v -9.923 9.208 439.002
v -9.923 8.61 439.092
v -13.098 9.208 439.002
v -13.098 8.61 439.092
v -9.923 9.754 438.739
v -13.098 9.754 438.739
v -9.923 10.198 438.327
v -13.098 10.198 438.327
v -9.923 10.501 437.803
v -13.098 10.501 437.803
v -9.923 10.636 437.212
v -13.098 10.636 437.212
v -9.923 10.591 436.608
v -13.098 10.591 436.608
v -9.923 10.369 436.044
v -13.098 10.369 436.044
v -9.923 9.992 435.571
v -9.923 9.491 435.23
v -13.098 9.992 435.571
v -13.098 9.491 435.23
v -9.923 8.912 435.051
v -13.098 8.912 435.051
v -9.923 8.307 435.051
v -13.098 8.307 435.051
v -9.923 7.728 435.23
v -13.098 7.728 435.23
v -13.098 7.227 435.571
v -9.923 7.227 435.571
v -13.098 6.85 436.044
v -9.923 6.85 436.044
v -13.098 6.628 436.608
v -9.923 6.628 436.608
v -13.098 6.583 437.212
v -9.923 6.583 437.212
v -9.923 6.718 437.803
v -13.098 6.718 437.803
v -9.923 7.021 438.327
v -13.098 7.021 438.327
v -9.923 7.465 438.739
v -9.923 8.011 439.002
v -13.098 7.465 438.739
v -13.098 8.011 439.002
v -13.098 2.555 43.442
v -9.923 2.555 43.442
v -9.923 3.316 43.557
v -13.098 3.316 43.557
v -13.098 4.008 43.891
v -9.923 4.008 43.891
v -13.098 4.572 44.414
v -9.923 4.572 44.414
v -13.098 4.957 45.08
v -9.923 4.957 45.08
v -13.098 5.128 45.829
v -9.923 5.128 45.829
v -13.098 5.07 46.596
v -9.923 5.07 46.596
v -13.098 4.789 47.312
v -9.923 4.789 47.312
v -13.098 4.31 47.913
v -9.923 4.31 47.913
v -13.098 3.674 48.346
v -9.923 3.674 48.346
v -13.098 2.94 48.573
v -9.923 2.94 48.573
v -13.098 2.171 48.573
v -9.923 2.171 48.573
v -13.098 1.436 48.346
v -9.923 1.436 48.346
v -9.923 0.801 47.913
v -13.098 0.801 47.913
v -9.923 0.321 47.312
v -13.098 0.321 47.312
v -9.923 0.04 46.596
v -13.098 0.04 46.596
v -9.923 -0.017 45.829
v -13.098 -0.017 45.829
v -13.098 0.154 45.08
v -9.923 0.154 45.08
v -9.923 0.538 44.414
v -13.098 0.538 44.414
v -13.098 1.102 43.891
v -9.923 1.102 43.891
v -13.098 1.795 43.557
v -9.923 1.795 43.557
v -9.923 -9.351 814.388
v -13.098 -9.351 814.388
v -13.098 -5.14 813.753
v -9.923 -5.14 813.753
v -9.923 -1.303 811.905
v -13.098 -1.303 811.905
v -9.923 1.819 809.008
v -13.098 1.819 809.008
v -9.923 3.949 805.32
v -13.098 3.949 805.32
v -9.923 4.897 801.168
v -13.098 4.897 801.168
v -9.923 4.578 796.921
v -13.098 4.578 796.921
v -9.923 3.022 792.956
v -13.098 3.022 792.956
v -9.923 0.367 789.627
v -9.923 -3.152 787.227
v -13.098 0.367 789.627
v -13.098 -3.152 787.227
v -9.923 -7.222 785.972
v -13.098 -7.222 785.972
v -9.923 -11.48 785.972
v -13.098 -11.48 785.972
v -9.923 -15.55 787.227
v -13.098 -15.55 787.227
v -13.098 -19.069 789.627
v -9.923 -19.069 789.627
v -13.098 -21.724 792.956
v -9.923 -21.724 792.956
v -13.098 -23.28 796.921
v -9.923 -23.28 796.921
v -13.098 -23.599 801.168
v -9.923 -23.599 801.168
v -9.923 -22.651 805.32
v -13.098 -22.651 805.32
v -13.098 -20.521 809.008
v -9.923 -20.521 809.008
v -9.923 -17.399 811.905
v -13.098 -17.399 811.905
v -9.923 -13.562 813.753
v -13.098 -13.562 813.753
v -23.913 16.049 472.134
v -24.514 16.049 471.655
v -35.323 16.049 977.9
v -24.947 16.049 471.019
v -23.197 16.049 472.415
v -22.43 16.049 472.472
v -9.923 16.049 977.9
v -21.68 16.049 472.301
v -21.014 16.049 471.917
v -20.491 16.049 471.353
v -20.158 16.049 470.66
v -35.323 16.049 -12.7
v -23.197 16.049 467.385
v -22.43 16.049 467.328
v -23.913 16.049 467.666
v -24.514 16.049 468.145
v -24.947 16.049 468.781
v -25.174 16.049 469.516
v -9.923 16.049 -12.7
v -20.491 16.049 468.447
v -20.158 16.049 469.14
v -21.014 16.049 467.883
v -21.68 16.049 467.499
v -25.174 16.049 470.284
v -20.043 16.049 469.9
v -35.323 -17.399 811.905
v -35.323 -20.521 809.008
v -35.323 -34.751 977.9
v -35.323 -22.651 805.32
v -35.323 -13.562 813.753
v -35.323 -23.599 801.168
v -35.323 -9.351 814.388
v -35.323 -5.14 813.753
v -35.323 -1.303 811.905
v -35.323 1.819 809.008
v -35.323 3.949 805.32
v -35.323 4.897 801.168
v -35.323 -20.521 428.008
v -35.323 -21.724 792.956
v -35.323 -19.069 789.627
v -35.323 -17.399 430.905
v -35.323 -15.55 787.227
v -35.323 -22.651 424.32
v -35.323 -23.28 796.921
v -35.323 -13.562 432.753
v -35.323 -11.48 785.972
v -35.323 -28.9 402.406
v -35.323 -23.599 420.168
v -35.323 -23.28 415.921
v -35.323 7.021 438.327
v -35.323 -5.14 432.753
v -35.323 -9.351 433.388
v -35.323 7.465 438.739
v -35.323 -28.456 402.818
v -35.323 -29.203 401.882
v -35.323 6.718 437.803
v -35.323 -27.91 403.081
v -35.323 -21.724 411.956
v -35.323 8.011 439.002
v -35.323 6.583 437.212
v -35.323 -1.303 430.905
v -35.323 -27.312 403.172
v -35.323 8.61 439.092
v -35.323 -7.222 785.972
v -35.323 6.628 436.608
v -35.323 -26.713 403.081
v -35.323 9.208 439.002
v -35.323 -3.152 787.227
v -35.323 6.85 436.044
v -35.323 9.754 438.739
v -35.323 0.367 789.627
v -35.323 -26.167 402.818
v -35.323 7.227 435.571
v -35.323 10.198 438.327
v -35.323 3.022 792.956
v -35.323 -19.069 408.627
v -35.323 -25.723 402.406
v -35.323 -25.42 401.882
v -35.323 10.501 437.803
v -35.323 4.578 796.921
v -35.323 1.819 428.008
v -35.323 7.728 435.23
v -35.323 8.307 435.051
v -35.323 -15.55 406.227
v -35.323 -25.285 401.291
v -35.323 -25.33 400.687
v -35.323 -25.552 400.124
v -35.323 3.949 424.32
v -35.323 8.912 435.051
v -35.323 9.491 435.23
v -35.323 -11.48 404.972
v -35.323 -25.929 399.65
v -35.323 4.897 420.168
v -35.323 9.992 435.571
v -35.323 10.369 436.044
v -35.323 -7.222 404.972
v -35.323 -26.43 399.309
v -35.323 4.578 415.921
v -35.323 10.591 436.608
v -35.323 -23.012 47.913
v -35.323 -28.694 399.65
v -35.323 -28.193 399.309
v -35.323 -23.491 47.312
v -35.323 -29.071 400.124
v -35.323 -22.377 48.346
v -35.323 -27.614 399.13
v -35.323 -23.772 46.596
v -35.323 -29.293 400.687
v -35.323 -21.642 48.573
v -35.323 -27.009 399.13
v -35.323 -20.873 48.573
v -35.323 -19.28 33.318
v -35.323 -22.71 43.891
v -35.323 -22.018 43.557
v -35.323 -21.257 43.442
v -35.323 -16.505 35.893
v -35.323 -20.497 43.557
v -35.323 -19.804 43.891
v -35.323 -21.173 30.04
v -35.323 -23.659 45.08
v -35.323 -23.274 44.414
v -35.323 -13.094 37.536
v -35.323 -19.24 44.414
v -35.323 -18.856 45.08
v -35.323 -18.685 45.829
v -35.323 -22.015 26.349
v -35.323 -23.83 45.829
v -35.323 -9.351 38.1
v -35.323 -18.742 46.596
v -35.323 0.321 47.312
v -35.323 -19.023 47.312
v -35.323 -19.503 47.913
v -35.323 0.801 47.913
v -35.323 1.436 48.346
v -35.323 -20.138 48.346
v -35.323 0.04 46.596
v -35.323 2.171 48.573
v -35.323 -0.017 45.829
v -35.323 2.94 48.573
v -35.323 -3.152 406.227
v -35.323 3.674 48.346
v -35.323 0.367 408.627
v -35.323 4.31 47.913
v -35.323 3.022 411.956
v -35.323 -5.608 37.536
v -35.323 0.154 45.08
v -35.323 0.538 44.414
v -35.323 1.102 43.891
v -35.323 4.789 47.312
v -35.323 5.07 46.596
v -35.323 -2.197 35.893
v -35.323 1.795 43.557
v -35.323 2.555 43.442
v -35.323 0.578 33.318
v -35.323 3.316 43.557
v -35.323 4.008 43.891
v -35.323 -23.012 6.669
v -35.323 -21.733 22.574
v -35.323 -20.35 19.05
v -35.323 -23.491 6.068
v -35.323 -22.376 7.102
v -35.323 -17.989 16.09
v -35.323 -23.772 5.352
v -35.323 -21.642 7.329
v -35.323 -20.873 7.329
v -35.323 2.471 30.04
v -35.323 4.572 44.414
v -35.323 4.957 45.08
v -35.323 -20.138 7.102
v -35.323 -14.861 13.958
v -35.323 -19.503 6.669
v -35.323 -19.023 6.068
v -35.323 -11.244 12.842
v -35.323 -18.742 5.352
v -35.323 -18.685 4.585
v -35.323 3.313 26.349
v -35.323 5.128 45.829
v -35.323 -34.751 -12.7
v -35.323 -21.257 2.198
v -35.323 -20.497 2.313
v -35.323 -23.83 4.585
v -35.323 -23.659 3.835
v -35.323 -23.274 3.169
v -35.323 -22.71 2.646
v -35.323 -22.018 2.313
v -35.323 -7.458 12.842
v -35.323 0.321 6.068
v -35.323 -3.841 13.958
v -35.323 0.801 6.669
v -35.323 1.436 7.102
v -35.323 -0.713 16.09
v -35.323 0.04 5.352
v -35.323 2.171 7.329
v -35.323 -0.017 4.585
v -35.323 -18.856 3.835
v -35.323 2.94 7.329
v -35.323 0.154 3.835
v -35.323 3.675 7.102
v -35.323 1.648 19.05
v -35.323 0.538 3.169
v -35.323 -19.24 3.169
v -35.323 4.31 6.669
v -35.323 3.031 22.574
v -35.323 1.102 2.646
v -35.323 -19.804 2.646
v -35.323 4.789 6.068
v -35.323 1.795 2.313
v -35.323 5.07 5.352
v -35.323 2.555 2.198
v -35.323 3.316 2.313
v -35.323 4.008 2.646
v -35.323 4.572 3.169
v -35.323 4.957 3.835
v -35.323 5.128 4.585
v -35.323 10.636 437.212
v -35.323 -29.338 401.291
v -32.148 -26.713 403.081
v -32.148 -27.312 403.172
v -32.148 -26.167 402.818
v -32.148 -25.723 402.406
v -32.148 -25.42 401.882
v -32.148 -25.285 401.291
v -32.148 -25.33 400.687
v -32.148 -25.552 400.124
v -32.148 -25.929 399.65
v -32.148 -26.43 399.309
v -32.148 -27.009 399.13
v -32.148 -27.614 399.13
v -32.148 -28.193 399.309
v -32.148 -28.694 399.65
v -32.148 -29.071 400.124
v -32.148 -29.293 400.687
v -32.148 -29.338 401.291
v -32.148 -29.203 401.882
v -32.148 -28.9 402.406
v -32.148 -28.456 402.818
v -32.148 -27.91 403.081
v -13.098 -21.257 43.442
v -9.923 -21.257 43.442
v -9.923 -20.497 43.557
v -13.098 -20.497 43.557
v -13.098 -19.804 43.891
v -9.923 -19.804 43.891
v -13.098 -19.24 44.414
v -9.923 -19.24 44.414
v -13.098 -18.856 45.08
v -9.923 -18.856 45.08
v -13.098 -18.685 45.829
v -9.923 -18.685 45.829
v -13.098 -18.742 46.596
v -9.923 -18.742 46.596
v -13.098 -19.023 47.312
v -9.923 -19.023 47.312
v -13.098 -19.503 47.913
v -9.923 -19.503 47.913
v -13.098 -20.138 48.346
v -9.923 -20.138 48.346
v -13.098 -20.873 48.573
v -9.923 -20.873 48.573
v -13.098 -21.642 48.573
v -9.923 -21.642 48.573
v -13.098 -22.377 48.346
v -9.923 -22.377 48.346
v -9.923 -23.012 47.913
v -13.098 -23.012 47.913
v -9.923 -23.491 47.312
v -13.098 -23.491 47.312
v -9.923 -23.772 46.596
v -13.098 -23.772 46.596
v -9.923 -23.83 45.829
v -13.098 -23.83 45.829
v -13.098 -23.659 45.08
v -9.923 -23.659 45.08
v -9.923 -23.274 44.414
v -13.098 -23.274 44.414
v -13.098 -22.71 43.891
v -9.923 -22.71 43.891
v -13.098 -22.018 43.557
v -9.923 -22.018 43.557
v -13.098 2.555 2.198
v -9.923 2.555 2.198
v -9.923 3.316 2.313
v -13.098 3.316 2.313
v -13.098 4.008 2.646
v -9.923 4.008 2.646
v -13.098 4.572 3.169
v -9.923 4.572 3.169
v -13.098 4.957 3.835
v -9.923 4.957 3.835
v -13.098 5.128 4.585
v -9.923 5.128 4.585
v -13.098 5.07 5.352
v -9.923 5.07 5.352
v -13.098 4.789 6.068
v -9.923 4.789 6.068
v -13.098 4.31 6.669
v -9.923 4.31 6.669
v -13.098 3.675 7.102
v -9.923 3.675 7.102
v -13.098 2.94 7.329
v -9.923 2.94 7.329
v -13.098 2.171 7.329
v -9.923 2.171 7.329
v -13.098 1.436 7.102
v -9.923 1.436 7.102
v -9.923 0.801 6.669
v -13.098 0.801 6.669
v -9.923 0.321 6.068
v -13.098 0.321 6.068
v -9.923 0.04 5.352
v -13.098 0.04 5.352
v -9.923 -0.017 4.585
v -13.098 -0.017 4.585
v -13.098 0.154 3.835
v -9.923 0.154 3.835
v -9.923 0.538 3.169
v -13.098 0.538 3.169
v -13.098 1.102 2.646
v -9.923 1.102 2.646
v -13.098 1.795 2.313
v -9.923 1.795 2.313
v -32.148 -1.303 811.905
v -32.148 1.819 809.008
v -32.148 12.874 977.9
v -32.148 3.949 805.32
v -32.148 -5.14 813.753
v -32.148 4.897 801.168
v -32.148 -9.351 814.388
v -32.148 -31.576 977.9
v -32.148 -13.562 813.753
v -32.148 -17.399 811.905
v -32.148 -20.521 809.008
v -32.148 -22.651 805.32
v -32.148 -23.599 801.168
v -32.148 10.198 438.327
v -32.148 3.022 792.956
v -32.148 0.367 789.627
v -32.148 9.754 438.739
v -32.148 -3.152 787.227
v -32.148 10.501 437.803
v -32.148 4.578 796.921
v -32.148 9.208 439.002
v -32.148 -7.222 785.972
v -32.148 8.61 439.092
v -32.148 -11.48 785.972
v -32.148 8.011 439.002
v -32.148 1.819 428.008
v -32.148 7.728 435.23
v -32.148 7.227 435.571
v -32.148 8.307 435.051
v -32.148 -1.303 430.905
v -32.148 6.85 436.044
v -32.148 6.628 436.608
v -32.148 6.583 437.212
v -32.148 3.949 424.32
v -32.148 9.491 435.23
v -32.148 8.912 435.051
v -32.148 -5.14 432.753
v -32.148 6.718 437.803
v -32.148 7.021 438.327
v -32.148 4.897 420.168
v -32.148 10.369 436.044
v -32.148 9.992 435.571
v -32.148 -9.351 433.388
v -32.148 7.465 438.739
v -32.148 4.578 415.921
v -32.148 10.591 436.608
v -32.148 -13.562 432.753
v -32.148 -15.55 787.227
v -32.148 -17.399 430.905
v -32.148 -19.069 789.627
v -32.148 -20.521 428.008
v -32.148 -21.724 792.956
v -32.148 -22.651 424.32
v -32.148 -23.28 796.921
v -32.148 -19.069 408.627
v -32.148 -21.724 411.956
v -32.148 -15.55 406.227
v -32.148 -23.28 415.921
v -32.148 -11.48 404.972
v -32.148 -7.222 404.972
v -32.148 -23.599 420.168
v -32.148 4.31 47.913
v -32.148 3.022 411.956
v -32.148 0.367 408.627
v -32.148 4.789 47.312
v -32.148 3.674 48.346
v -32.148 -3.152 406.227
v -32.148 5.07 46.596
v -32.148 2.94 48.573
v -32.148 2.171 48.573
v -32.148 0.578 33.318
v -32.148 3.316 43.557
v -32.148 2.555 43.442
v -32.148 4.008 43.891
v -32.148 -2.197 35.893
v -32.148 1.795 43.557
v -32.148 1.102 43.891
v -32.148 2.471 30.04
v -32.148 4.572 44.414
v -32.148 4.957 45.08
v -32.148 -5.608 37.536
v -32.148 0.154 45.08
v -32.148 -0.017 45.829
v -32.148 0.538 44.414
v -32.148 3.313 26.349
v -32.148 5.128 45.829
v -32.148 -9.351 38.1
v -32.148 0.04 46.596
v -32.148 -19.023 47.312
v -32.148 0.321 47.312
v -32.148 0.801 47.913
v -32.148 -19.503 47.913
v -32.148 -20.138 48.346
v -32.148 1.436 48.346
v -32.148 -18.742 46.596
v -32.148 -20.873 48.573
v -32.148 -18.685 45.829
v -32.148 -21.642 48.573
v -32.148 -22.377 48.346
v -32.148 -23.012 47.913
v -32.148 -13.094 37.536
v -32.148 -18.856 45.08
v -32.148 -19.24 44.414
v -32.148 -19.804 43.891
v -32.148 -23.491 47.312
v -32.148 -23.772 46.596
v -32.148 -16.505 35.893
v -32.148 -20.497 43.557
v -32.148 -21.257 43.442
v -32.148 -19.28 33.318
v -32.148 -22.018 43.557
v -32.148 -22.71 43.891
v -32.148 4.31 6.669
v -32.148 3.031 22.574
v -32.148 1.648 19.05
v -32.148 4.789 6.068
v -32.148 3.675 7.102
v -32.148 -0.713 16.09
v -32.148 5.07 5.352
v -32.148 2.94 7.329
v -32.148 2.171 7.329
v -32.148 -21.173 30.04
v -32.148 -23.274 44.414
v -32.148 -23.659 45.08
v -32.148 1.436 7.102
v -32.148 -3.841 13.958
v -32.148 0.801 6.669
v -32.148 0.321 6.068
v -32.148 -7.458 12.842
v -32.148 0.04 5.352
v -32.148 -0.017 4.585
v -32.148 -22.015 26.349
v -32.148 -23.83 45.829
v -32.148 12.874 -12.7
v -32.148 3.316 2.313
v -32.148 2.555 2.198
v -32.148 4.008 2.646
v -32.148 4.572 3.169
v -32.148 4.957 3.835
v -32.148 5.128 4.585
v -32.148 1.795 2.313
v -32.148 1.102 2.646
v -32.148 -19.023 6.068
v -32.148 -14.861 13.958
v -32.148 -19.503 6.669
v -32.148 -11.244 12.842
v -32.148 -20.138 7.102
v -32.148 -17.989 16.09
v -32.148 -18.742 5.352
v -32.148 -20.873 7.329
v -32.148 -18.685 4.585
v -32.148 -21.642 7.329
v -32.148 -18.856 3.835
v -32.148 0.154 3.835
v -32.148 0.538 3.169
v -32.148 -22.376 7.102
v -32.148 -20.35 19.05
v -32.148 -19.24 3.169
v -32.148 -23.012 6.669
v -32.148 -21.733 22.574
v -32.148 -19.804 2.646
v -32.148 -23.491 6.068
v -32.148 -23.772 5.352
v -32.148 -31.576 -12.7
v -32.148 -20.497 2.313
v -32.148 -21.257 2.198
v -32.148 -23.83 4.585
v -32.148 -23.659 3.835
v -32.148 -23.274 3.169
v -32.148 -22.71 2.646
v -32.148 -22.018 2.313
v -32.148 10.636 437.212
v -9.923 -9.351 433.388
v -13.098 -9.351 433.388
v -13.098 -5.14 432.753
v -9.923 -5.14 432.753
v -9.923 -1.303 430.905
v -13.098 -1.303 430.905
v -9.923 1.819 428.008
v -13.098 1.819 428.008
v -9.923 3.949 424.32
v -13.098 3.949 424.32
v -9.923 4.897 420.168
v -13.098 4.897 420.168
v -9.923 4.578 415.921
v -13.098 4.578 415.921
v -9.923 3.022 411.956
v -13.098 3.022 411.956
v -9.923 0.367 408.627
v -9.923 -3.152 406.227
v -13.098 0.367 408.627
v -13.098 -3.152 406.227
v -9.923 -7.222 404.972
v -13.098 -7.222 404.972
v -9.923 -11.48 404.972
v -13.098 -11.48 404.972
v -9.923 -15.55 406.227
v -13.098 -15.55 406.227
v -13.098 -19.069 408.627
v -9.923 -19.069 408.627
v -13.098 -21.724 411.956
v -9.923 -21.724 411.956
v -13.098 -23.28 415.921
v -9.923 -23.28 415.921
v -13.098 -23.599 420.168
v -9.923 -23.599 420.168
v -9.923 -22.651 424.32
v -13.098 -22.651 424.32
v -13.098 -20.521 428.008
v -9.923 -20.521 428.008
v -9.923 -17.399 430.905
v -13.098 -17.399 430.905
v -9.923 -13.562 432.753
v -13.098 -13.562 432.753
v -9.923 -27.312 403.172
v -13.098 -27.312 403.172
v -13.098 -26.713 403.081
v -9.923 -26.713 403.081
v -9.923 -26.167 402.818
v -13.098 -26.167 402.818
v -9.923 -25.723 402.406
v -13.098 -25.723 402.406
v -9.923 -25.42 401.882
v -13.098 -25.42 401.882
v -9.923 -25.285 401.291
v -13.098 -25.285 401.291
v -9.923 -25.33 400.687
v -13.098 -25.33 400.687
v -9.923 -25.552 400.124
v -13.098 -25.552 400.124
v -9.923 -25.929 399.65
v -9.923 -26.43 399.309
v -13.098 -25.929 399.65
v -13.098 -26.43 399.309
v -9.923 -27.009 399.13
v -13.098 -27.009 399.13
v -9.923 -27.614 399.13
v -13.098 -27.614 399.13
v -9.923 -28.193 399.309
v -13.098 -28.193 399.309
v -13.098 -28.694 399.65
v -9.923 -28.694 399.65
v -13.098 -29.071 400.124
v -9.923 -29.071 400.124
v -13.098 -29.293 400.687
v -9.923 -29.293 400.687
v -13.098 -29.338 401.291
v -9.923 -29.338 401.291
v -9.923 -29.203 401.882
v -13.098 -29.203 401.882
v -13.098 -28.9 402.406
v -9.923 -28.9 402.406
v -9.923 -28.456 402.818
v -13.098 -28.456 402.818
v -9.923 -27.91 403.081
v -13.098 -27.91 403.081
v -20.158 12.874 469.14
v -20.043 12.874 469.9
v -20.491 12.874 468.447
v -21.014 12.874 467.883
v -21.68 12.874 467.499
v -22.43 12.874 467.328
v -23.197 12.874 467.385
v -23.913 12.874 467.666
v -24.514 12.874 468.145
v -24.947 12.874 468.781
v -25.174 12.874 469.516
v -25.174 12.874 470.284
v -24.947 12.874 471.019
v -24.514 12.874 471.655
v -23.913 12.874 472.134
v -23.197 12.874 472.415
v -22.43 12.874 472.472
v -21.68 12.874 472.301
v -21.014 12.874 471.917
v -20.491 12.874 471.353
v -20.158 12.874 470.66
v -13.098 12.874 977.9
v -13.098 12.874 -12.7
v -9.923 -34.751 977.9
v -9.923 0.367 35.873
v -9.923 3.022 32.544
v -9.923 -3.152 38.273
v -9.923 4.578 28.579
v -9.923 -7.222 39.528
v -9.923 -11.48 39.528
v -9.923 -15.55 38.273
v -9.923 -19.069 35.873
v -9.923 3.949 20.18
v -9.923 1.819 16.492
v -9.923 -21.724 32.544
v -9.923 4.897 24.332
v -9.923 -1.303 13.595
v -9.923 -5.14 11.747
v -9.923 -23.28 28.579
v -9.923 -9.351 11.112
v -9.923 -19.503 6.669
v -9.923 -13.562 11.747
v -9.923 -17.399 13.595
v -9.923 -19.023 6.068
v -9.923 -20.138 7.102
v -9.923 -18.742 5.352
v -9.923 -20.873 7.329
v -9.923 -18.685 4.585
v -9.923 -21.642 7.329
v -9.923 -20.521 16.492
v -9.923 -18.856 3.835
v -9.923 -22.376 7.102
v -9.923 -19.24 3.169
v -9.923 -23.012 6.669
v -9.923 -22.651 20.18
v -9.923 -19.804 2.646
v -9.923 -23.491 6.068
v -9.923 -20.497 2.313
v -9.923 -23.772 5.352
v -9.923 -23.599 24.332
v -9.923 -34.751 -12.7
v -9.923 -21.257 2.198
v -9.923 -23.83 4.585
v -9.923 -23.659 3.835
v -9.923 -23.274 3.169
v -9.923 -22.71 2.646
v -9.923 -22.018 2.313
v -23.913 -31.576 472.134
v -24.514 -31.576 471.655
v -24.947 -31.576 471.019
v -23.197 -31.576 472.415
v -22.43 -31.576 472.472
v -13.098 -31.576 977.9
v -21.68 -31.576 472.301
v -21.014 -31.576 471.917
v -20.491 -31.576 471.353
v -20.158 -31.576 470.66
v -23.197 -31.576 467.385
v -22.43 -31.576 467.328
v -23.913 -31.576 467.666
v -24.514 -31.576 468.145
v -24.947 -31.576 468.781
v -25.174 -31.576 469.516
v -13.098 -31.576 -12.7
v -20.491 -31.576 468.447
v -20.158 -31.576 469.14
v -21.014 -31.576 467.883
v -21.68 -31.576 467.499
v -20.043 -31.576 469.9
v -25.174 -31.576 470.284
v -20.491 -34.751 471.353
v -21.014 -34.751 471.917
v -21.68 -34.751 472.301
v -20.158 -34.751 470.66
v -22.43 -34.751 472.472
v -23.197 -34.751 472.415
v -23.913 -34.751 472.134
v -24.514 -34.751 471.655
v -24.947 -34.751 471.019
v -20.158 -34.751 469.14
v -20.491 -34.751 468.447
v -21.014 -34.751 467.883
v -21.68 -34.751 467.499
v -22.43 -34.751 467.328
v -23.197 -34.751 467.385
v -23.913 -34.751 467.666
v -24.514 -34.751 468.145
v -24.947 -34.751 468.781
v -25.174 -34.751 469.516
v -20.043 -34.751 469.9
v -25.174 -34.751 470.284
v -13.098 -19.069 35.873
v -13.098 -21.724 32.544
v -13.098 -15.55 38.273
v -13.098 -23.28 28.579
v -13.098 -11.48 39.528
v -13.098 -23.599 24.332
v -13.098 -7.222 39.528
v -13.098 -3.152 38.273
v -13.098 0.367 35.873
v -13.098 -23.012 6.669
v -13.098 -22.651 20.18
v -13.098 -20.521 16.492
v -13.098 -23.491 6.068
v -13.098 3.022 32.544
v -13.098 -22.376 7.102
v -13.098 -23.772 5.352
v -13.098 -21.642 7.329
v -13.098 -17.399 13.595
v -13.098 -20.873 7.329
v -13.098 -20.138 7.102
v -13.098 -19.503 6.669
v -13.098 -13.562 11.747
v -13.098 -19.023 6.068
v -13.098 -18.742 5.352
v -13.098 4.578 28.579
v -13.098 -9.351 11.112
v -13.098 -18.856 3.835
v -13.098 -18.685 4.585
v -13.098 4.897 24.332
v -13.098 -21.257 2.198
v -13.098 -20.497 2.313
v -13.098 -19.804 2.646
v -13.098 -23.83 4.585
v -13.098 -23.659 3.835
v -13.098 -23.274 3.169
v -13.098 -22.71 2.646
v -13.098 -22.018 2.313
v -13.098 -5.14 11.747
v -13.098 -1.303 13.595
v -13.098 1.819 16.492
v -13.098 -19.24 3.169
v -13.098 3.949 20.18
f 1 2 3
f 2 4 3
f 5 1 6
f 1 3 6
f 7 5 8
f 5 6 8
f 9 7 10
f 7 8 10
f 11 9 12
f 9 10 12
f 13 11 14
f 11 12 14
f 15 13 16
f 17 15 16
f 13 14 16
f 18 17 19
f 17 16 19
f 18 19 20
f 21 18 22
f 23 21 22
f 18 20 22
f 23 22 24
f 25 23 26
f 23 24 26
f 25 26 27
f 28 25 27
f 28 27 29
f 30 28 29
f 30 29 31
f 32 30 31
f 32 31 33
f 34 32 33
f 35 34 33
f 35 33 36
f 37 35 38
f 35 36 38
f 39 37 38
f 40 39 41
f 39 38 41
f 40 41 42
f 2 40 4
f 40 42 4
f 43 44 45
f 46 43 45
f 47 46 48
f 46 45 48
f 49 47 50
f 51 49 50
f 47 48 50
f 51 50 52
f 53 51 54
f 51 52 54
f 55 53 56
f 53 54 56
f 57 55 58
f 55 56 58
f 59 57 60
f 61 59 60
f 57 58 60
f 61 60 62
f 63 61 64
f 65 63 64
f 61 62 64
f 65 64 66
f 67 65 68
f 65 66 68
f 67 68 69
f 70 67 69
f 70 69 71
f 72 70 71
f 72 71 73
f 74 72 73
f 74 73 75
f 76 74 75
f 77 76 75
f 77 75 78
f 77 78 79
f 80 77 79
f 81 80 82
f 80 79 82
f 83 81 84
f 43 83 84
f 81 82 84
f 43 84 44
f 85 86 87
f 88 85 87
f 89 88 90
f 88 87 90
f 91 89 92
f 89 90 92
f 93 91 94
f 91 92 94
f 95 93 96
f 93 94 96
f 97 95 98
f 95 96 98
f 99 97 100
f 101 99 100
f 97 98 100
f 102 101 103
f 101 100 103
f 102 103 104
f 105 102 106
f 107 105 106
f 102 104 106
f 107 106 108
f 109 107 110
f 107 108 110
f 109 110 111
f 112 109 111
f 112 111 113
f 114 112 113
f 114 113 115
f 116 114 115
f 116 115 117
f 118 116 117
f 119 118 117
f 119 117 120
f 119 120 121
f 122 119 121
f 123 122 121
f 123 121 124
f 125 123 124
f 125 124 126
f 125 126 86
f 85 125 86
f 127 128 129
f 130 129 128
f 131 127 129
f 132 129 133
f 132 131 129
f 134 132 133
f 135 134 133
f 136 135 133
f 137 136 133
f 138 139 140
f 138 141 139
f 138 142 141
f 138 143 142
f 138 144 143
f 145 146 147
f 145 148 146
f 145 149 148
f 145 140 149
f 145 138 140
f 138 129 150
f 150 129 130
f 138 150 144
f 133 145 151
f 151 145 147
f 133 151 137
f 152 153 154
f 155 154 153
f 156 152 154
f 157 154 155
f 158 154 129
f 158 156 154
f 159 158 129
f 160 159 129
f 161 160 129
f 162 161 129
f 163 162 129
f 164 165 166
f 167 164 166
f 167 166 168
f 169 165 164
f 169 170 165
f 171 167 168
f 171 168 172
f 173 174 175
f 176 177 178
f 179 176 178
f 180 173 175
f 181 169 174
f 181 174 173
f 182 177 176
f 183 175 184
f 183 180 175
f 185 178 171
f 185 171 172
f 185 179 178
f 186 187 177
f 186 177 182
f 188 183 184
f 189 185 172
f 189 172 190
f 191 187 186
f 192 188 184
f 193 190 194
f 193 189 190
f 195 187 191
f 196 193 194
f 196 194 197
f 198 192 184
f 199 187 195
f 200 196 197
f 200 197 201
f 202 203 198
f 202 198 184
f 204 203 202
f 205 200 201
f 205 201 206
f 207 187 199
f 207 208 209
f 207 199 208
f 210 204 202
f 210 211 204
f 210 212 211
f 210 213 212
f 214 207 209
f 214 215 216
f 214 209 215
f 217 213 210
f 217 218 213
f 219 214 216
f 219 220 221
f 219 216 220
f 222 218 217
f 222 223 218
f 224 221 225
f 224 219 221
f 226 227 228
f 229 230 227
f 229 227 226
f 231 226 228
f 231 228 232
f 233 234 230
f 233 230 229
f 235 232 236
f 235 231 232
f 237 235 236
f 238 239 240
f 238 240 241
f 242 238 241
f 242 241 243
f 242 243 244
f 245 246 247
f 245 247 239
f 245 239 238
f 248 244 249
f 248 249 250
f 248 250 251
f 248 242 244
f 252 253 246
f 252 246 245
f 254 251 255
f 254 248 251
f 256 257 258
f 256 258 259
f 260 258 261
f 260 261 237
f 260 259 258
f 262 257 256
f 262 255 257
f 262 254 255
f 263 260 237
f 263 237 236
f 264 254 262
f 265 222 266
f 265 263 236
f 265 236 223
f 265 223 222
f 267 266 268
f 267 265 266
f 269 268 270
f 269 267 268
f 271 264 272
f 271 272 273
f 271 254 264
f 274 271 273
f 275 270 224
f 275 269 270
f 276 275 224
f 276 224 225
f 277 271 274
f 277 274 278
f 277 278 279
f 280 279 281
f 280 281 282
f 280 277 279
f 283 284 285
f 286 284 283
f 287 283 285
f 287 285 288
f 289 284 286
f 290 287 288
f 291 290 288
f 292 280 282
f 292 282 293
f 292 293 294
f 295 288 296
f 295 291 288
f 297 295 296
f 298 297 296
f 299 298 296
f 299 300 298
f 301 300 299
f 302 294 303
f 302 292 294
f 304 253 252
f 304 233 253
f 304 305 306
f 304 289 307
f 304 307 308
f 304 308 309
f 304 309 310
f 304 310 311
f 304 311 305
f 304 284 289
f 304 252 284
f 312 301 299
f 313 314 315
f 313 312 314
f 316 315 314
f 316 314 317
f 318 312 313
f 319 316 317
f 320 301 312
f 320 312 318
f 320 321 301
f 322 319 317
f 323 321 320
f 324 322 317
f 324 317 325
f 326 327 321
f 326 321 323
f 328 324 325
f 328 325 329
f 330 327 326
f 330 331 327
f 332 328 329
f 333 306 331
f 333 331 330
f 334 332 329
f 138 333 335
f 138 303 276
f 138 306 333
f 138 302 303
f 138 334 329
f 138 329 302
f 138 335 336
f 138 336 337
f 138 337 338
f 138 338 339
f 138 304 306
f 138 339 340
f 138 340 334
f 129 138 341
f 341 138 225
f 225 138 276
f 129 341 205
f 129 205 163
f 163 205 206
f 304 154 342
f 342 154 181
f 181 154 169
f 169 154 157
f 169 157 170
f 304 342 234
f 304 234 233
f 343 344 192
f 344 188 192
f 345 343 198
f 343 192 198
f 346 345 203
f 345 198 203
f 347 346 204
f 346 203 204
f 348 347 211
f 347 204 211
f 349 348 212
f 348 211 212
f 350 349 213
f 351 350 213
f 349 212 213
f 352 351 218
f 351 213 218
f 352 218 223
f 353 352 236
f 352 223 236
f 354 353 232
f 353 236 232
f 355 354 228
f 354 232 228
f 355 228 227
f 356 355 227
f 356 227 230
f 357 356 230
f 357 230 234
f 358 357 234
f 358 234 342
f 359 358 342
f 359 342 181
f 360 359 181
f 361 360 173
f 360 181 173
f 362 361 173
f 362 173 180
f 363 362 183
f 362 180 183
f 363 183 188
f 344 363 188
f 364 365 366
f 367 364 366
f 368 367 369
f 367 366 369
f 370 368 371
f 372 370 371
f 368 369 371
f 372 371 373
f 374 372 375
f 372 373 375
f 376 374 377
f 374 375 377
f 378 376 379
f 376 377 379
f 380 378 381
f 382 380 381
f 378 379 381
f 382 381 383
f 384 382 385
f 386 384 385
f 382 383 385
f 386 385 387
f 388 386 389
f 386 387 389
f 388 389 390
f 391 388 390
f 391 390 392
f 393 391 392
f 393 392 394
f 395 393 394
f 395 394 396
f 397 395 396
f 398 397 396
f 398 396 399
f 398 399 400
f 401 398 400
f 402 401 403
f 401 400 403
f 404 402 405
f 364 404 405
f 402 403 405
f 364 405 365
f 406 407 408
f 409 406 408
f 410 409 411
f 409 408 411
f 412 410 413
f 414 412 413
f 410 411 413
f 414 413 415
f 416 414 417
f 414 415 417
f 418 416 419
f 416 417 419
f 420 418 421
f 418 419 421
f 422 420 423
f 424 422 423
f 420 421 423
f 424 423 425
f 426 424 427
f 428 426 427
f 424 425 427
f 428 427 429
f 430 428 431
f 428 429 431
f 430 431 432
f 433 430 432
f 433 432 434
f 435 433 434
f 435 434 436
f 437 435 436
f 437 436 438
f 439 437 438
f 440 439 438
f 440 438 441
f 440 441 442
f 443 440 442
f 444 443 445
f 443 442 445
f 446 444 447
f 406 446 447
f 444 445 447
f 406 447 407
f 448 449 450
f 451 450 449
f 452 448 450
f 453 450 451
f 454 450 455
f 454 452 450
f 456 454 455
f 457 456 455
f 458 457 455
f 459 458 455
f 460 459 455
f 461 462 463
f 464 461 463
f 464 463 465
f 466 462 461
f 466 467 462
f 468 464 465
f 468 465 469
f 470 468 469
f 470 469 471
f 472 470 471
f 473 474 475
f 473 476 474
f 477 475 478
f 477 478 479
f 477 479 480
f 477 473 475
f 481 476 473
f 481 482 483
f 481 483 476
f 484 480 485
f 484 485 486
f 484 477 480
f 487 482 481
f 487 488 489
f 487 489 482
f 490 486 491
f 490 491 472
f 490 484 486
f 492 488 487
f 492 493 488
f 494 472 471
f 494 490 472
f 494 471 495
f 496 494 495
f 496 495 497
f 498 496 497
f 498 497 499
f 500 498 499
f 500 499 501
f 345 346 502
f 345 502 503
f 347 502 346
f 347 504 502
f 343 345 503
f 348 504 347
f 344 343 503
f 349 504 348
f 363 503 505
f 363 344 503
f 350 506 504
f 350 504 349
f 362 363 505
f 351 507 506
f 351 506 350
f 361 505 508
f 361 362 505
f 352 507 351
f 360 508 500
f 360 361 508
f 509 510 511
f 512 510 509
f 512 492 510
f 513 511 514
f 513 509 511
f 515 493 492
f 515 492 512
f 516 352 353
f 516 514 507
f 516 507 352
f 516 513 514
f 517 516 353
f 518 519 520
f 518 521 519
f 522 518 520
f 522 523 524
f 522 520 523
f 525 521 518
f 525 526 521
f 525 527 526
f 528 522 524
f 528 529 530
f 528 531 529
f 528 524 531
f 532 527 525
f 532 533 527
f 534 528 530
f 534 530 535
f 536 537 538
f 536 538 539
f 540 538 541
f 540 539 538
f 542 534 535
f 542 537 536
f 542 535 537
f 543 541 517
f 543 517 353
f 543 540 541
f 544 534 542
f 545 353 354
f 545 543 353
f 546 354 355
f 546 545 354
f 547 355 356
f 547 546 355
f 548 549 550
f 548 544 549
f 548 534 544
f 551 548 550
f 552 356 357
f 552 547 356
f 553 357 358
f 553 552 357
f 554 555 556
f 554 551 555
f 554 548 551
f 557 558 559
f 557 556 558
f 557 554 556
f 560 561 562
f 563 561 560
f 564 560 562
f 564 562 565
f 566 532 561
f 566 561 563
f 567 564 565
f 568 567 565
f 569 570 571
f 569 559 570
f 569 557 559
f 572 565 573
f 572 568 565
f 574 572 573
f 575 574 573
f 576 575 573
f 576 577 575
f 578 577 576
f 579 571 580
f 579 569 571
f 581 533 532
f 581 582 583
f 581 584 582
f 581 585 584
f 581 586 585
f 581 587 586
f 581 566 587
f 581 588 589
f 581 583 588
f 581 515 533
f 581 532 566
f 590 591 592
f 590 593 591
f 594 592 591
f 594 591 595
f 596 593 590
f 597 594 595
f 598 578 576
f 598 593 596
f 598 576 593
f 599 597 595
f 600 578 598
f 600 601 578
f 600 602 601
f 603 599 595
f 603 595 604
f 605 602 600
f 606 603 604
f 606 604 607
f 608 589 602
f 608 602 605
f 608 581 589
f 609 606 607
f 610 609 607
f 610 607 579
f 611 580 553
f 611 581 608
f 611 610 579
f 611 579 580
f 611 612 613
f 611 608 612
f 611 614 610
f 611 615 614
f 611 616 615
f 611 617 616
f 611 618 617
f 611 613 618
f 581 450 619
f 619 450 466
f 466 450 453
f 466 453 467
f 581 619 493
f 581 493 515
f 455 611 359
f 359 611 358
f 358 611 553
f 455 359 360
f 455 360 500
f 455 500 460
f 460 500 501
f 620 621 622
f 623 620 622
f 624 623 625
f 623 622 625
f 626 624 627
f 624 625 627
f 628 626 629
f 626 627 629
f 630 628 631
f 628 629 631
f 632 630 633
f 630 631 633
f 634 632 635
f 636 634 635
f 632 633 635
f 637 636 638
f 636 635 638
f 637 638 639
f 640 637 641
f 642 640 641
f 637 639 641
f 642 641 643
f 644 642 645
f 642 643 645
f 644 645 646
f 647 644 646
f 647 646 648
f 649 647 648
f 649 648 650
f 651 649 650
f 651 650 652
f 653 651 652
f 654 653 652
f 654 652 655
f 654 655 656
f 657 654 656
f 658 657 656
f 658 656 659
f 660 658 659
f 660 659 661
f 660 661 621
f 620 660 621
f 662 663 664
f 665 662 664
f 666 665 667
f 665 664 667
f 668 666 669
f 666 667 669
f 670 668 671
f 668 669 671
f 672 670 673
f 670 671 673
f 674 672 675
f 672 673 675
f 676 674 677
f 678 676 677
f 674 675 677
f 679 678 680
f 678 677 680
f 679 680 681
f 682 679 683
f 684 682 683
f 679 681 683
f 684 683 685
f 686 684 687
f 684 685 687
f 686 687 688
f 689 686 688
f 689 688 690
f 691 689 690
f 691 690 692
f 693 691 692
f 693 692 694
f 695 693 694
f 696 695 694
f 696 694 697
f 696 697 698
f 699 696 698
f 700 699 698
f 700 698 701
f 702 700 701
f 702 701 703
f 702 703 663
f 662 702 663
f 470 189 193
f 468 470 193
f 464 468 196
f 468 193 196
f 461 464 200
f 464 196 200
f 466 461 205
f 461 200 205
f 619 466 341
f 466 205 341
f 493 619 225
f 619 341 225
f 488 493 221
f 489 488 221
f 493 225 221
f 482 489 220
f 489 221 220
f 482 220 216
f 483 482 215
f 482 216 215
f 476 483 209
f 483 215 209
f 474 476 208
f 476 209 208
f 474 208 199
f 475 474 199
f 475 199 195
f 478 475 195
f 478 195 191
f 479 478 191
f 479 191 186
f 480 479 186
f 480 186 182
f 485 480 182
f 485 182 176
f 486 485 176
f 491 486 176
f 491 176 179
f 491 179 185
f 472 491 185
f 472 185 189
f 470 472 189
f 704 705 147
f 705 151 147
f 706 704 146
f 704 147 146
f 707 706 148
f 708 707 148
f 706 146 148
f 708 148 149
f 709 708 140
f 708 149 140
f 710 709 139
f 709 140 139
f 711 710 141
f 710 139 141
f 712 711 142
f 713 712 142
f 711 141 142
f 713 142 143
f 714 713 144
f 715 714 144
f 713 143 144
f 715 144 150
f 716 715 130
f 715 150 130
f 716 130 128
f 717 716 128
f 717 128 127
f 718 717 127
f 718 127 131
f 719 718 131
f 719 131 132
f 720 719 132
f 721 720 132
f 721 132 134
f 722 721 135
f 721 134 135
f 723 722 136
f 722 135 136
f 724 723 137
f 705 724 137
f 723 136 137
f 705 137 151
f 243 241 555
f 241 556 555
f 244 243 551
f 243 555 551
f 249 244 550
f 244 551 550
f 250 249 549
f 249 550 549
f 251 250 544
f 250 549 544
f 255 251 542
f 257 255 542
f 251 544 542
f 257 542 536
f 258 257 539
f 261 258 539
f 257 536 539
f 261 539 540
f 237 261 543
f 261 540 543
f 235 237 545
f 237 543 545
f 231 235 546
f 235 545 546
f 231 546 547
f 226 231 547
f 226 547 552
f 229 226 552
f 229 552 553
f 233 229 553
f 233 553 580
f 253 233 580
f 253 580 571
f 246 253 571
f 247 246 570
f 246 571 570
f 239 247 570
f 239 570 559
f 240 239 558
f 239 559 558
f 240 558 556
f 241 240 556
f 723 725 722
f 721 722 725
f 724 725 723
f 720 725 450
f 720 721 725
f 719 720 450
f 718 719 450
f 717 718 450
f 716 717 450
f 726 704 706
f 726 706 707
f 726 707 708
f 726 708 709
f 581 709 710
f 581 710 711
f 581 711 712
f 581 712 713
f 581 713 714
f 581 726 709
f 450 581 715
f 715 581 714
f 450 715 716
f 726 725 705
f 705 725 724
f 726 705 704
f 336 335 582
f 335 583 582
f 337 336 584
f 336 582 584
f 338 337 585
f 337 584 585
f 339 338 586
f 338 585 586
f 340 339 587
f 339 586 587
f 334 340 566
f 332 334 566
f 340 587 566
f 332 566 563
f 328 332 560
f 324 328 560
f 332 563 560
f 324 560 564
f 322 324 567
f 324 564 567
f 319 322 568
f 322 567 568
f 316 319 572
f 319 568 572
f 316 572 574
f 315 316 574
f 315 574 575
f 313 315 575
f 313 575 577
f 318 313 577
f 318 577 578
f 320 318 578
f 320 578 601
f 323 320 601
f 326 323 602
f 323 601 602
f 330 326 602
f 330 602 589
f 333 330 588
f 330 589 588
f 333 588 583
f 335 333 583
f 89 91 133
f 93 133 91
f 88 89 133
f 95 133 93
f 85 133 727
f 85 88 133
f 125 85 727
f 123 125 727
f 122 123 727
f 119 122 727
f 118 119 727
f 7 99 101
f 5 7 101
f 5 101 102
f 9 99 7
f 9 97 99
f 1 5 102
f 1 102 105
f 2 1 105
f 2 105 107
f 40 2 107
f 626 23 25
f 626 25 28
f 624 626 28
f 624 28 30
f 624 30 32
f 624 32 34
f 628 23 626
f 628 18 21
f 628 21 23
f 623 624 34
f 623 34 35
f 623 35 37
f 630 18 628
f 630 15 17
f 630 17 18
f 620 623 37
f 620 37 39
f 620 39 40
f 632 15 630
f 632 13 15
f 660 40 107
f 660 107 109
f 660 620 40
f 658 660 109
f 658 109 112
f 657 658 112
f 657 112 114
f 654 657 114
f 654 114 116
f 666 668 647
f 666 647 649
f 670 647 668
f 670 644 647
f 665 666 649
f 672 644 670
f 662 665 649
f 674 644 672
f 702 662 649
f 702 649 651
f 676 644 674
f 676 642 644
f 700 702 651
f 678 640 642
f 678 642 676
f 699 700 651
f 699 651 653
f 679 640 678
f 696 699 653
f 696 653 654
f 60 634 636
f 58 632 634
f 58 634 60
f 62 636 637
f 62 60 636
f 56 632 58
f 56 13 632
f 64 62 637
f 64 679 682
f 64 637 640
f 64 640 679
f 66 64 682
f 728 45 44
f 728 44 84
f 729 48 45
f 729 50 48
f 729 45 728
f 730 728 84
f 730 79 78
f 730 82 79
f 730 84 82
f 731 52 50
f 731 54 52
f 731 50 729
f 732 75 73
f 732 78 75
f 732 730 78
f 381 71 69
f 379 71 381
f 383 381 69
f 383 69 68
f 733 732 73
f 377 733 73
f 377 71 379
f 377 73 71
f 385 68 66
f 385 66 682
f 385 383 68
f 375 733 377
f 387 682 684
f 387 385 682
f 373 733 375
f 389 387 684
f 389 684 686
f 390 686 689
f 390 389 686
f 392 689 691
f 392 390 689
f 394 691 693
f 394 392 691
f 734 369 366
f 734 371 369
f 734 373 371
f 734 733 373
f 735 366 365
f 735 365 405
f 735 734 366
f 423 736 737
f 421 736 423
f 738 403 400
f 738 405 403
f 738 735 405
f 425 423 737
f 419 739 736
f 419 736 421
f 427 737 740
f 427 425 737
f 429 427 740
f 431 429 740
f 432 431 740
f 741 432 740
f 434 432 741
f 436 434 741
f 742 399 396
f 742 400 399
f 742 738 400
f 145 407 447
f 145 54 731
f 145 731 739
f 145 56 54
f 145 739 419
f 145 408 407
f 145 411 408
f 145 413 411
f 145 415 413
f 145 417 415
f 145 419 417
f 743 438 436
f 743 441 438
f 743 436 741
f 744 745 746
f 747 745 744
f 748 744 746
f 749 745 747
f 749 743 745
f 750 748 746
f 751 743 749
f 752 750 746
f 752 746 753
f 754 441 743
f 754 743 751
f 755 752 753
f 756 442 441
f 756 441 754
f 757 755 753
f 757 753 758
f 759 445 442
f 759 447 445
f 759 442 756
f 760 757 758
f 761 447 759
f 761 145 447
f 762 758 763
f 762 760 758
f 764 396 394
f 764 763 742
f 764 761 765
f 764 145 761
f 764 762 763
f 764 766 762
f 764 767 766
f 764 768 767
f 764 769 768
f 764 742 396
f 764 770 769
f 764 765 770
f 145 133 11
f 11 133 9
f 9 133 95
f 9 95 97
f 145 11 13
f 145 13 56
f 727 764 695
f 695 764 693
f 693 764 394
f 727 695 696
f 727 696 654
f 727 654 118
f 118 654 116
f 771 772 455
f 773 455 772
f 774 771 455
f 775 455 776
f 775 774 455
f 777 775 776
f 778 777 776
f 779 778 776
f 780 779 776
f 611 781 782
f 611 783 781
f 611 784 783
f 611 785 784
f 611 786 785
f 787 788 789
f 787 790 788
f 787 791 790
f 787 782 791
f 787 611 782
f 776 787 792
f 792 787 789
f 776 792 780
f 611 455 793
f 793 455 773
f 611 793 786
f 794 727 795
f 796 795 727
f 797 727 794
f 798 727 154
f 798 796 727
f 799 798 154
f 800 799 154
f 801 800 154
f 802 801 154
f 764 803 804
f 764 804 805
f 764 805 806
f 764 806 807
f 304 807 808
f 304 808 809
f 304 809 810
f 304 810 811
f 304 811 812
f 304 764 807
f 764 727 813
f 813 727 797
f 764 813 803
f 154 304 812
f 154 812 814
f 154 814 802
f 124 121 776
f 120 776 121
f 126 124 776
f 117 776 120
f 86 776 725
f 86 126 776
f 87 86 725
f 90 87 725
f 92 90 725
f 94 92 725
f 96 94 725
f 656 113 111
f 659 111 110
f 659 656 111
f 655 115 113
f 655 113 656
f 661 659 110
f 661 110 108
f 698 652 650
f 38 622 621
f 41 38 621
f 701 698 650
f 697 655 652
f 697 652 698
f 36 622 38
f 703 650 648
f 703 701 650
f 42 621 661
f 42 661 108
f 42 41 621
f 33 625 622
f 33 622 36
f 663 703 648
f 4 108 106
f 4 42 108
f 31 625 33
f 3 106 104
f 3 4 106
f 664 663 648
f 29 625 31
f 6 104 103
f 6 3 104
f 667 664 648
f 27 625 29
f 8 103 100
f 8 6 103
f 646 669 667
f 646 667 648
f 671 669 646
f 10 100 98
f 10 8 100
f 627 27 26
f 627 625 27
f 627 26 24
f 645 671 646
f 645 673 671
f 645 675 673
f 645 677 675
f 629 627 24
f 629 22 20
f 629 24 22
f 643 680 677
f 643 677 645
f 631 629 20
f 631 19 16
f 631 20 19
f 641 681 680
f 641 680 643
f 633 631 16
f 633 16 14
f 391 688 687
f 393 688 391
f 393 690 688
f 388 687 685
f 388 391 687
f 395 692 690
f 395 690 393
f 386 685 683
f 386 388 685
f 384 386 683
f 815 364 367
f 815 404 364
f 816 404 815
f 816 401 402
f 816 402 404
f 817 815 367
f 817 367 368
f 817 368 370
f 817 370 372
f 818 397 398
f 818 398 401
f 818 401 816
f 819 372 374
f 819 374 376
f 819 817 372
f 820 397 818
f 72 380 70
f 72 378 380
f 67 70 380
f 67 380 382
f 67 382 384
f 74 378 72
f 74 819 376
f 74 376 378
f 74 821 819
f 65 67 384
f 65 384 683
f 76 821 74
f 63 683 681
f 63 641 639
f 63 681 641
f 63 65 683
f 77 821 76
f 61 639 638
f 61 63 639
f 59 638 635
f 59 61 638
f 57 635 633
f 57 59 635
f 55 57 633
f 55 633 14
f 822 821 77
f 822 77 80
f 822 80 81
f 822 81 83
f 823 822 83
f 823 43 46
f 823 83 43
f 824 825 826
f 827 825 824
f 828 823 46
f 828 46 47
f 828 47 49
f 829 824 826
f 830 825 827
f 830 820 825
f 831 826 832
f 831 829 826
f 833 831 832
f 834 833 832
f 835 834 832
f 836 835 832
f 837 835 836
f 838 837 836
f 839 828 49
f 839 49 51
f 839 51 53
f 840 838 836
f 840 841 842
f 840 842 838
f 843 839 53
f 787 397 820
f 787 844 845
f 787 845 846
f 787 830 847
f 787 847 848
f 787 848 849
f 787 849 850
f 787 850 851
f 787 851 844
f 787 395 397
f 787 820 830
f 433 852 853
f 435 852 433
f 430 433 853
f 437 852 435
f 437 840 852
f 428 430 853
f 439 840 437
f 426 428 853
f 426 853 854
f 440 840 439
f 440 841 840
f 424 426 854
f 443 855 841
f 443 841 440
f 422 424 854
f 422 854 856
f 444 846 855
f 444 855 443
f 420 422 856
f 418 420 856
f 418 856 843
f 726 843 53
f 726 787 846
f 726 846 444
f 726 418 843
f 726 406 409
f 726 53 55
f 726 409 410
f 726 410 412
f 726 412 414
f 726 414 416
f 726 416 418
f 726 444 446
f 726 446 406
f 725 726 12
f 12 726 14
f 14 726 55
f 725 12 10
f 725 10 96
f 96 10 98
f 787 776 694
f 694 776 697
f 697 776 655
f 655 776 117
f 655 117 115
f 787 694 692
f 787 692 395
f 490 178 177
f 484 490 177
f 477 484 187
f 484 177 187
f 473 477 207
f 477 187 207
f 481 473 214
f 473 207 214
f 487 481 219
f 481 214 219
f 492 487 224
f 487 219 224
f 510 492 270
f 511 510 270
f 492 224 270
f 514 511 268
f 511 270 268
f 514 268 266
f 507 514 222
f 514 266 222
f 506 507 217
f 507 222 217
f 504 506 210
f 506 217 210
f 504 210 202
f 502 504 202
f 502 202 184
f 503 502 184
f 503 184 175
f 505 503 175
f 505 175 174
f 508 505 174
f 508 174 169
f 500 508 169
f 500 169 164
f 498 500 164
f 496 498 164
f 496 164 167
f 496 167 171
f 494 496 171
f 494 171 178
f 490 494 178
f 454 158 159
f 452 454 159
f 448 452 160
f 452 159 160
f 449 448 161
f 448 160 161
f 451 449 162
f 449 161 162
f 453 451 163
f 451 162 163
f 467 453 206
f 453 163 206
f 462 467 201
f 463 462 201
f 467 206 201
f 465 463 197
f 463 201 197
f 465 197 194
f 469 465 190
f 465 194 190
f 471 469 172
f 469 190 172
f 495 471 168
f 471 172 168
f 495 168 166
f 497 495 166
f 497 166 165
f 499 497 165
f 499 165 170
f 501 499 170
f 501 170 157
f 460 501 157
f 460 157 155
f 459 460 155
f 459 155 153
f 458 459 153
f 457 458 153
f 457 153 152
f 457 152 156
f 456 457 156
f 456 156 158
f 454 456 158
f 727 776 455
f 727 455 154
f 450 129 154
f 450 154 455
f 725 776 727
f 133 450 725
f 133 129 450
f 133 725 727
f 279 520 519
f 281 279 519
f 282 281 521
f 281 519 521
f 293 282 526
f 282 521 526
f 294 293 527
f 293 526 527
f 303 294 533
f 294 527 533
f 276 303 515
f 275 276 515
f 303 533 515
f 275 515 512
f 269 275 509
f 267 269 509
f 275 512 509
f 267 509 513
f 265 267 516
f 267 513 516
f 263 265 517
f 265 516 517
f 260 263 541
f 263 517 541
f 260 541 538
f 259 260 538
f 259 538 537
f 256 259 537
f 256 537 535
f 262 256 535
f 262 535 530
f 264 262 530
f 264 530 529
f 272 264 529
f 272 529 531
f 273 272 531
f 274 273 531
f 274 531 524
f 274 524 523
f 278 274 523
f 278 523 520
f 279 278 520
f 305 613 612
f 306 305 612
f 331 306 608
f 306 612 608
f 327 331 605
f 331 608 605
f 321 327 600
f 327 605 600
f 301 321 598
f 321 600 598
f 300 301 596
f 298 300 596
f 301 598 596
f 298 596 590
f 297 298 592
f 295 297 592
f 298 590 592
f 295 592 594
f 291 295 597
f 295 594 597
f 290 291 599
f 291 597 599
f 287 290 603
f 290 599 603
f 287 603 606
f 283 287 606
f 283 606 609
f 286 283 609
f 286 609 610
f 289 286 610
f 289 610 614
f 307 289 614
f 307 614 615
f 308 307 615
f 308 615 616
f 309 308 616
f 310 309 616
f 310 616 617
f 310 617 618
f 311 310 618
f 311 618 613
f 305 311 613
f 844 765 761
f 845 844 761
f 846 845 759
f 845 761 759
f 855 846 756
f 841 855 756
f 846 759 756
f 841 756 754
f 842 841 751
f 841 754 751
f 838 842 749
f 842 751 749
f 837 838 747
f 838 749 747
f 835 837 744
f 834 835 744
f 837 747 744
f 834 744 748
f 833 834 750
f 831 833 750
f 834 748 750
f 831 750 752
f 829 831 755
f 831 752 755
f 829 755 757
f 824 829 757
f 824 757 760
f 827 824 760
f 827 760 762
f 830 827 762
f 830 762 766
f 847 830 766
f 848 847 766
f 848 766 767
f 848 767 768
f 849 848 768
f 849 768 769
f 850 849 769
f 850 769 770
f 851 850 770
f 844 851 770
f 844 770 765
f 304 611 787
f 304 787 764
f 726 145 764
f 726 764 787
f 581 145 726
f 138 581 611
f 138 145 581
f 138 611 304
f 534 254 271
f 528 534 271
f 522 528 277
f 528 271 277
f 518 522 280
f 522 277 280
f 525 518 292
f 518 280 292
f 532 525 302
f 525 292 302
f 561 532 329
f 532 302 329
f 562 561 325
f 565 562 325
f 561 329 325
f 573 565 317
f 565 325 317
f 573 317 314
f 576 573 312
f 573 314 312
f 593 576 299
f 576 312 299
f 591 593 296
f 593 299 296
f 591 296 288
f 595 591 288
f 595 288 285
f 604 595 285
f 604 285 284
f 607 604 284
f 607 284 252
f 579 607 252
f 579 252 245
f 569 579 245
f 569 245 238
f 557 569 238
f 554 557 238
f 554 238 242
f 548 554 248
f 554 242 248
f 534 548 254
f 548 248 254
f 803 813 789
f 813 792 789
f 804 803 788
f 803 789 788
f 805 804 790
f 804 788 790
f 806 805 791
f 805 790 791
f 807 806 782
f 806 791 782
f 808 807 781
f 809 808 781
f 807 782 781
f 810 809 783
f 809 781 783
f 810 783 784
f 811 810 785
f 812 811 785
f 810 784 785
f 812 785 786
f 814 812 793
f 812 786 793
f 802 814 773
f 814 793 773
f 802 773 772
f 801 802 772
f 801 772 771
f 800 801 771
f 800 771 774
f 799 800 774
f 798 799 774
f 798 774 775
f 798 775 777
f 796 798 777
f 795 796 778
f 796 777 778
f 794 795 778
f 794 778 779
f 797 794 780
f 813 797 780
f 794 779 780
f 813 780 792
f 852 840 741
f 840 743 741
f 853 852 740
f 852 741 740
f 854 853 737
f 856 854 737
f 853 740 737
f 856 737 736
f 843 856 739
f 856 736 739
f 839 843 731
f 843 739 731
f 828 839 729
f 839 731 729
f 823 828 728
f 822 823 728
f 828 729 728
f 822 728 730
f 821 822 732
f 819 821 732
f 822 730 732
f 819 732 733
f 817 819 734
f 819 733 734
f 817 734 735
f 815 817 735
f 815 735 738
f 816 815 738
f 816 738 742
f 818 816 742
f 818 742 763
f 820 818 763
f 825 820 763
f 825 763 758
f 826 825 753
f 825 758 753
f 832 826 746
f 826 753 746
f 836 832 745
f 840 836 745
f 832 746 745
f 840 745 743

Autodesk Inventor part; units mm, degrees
ref_plane "YZ Plane" through (0, 0, 0) normal (1, 0, 0) x (0, 1, 0)
ref_plane "XZ Plane" through (0, 0, 0) normal (0, 1, 0) x (-1, 0, 0)
ref_plane "XY Plane" through (0, 0, 0) normal (0, 0, 1) x (1, 0, 0)
sketch "Sketch1" plane through (0, 0, 0) normal (0, 0, 1) x (1, 0, 0)
  line L0 (-35.3228, 16.049) -> (-9.9228, 16.049)
  line L1 (-9.9228, 16.049) -> (-9.9228, -34.751)
  line L2 (-9.9228, -34.751) -> (-35.3228, -34.751)
  line L3 (-35.3228, -34.751) -> (-35.3228, 16.049)
  line L4 (-13.0978, 12.874) -> (-32.1478, 12.874)
  line L5 (-32.1478, 12.874) -> (-32.1478, -31.576)
  line L6 (-32.1478, -31.576) -> (-13.0978, -31.576)
  line L7 (-13.0978, -31.576) -> (-13.0978, 12.874)
  point P0 (0, 0)
  dimension "d0" = 25.4
  dimension "d1" = 50.8
  dimension "d2" = 3.175
extrude "Extrusion1" add sketch "Sketch1" along normal blind 977.9
sketch "Sketch2" plane through (-35.3228, -34.751, 0) normal (-1, 0, 0) x (0, 0, 1)
  line L0 (0, 0) -> (0, 50.8) construction
  line L1 (0, 25.4) -> (25.4, 25.4) construction
  circle A0 centre (25.4, 25.4) radius 12.7
  point P0 (0, 34.751)
  dimension "d5" = 25.4
  dimension "d9" = 25.4
extrude "Extrusion2" cut sketch "Sketch2" against normal blind 12.7
sketch "Sketch3" plane through (-35.3228, -34.751, 0) normal (-1, 0, 0) x (0, 0, 1)
  line L0 (977.9, 50.8) -> (977.9, 0) construction
  line L1 (977.9, 25.4) -> (800.1, 25.4) construction
  circle A0 centre (800.1, 25.4) radius 14.2875
  point P0 (0, 34.751)
  dimension "d10" = 177.8
  dimension "d11" = 28.575
extrude "Extrusion3" cut sketch "Sketch3" against normal blind 25.4
sketch "Sketch4" plane through (-35.3228, -34.751, 0) normal (-1, 0, 0) x (0, 0, 1)
  line L0 (977.9, 50.8) -> (977.9, 0) construction
  line L1 (977.9, 25.4) -> (419.1, 25.4) construction
  circle A0 centre (419.1, 25.4) radius 14.2875
  point P0 (0, 34.751)
  dimension "d14" = 558.8
  dimension "d15" = 28.575
extrude "Extrusion4" cut sketch "Sketch4" against normal blind 25.4
sketch "Sketch5" plane through (-35.3228, -34.751, 0) normal (-1, 0, 0) x (0, 0, 1)
  circle A0 centre (419.1, 25.4) radius 14.2875 construction
  line L0 (419.1, 25.4) -> (401.1395, 7.4395) construction
  line L1 (419.1, 25.4) -> (444.5, 25.4) construction
  line L2 (419.1, 25.4) -> (437.0605, 43.3605) construction
  circle A1 centre (401.1395, 7.4395) radius 2.032
  circle A2 centre (437.0605, 43.3605) radius 2.032
  point P0 (0, 34.751)
  dimension "d18" = 25.4
  dimension "d19" = 135
  dimension "d20" = 25.4
  dimension "d21" = 4.064
  dimension "d22" = 4.064
extrude "Extrusion5" cut sketch "Sketch5" against normal blind 25.4
sketch "Sketch7" plane through (-9.9228, -34.751, 0) normal (1, 0, 0) x (0, 0, -1)
  line L0 (0, 0) -> (0, 50.8) construction
  line L1 (0, 25.4) -> (-25.4, 25.4) construction
  circle A0 centre (-25.4, 25.4) radius 14.2875
  point P0 (0, 34.751)
  dimension "d34" = 25.4
  dimension "d35" = 28.575
extrude "Extrusion7" cut sketch "Sketch7" against normal blind 12.7
sketch "Sketch8" plane through (-9.9228, -34.751, 0) normal (1, 0, 0) x (0, 0, -1)
  circle A0 centre (-25.4, 25.4) radius 14.2875 construction
  line L0 (-25.4, 25.4) -> (-25.4, 49.2125) construction
  line L1 (-25.4, 49.2125) -> (-4.7778, 37.3063) construction
  line L2 (-4.7778, 37.3063) -> (-4.7778, 13.4938) construction
  line L3 (-4.7778, 13.4938) -> (-25.4, 1.5875) construction
  line L4 (-25.4, 1.5875) -> (-46.0222, 13.4937) construction
  line L5 (-46.0222, 13.4937) -> (-46.0222, 37.3062) construction
  line L6 (-46.0222, 37.3062) -> (-25.4, 49.2125) construction
  circle A1 centre (-4.7778, 37.3063) radius 2.5797
  circle A2 centre (-4.7778, 13.4938) radius 2.5797
  circle A3 centre (-46.0222, 13.4937) radius 2.5797
  circle A4 centre (-46.0222, 37.3062) radius 2.5797
  point P0 (0, 34.751)
  dimension "d45" = 23.8125
  dimension "d46" = 5.1594
  dimension "d47" = 5.1594
  dimension "d48" = 5.1594
  dimension "d49" = 5.1594
extrude "Extrusion9" cut sketch "Sketch8" against normal blind 25.4
sketch "Sketch9" plane through (0, 0, 0) normal (0, 0, -1) x (-1, 0, 0)
  line L0 (9.9228, 16.049) -> (35.3228, 16.049) projected
  line L1 (9.9228, 16.049) -> (13.0978, 16.049)
  line L2 (13.0978, 16.049) -> (13.0978, -34.751)
  line L3 (13.0978, -34.751) -> (9.9228, -34.751)
  line L4 (9.9228, -34.751) -> (9.9228, 16.049)
  line L5 (9.9228, -34.751) -> (35.3228, -34.751)
  line L6 (35.3228, -34.751) -> (35.3228, -31.576)
  line L7 (35.3228, -31.576) -> (9.9228, -31.576)
  line L8 (9.9228, -31.576) -> (9.9228, -34.751)
  line L9 (9.9228, -34.751) -> (35.3228, -34.751) projected
  line L10 (35.3228, -34.751) -> (32.1478, -34.751)
  line L11 (32.1478, -34.751) -> (32.1478, 16.049)
  line L12 (32.1478, 16.049) -> (35.3228, 16.049)
  line L13 (35.3228, 16.049) -> (35.3228, -34.751)
  line L14 (35.3228, 16.049) -> (9.9228, 16.049)
  line L15 (9.9228, 16.049) -> (9.9228, 12.874)
  line L16 (9.9228, 12.874) -> (35.3228, 12.874)
  line L17 (35.3228, 12.874) -> (35.3228, 16.049)
  point P0 (0, 0)
  dimension "d52" = 3.175
  dimension "d53" = 50.8
  dimension "d54" = 25.4
  dimension "d55" = 3.175
  dimension "d56" = 3.175
  dimension "d57" = 50.8
  dimension "d58" = 25.4
  dimension "d59" = 3.175
extrude "Extrusion10" add sketch "Sketch9" along normal blind 12.7 contours L0 L2 L16 L4 | L0 L11 L16 L2 | L16 L2 L7 L4 | L0 L13 L16 L11 | L7 L2 L3 L4 | L16 L13 L7 L11 | L7 L11 L5 L2 | L7 L6 L5 L11
sketch "Sketch10" plane through (-35.3228, 16.049, 977.9) normal (0, 1, 0) x (1, 0, 0)
  line L0 (3.175, 0) -> (22.225, 0) construction
  line L1 (12.7, 0) -> (12.7, 508) construction
  line L2 (12.7, 0) -> (520.7, 0) construction
  circle A0 centre (12.7, 508) radius 2.5797
  point P0 (35.3228, 977.9)
  dimension "d62" = 508
  dimension "d63" = 90
  dimension "d64" = 5.1594
extrude "Extrusion11" cut sketch "Sketch10" against normal blind 101.6
properties part number "41.75in Arm Beam Alternate (Right)"
